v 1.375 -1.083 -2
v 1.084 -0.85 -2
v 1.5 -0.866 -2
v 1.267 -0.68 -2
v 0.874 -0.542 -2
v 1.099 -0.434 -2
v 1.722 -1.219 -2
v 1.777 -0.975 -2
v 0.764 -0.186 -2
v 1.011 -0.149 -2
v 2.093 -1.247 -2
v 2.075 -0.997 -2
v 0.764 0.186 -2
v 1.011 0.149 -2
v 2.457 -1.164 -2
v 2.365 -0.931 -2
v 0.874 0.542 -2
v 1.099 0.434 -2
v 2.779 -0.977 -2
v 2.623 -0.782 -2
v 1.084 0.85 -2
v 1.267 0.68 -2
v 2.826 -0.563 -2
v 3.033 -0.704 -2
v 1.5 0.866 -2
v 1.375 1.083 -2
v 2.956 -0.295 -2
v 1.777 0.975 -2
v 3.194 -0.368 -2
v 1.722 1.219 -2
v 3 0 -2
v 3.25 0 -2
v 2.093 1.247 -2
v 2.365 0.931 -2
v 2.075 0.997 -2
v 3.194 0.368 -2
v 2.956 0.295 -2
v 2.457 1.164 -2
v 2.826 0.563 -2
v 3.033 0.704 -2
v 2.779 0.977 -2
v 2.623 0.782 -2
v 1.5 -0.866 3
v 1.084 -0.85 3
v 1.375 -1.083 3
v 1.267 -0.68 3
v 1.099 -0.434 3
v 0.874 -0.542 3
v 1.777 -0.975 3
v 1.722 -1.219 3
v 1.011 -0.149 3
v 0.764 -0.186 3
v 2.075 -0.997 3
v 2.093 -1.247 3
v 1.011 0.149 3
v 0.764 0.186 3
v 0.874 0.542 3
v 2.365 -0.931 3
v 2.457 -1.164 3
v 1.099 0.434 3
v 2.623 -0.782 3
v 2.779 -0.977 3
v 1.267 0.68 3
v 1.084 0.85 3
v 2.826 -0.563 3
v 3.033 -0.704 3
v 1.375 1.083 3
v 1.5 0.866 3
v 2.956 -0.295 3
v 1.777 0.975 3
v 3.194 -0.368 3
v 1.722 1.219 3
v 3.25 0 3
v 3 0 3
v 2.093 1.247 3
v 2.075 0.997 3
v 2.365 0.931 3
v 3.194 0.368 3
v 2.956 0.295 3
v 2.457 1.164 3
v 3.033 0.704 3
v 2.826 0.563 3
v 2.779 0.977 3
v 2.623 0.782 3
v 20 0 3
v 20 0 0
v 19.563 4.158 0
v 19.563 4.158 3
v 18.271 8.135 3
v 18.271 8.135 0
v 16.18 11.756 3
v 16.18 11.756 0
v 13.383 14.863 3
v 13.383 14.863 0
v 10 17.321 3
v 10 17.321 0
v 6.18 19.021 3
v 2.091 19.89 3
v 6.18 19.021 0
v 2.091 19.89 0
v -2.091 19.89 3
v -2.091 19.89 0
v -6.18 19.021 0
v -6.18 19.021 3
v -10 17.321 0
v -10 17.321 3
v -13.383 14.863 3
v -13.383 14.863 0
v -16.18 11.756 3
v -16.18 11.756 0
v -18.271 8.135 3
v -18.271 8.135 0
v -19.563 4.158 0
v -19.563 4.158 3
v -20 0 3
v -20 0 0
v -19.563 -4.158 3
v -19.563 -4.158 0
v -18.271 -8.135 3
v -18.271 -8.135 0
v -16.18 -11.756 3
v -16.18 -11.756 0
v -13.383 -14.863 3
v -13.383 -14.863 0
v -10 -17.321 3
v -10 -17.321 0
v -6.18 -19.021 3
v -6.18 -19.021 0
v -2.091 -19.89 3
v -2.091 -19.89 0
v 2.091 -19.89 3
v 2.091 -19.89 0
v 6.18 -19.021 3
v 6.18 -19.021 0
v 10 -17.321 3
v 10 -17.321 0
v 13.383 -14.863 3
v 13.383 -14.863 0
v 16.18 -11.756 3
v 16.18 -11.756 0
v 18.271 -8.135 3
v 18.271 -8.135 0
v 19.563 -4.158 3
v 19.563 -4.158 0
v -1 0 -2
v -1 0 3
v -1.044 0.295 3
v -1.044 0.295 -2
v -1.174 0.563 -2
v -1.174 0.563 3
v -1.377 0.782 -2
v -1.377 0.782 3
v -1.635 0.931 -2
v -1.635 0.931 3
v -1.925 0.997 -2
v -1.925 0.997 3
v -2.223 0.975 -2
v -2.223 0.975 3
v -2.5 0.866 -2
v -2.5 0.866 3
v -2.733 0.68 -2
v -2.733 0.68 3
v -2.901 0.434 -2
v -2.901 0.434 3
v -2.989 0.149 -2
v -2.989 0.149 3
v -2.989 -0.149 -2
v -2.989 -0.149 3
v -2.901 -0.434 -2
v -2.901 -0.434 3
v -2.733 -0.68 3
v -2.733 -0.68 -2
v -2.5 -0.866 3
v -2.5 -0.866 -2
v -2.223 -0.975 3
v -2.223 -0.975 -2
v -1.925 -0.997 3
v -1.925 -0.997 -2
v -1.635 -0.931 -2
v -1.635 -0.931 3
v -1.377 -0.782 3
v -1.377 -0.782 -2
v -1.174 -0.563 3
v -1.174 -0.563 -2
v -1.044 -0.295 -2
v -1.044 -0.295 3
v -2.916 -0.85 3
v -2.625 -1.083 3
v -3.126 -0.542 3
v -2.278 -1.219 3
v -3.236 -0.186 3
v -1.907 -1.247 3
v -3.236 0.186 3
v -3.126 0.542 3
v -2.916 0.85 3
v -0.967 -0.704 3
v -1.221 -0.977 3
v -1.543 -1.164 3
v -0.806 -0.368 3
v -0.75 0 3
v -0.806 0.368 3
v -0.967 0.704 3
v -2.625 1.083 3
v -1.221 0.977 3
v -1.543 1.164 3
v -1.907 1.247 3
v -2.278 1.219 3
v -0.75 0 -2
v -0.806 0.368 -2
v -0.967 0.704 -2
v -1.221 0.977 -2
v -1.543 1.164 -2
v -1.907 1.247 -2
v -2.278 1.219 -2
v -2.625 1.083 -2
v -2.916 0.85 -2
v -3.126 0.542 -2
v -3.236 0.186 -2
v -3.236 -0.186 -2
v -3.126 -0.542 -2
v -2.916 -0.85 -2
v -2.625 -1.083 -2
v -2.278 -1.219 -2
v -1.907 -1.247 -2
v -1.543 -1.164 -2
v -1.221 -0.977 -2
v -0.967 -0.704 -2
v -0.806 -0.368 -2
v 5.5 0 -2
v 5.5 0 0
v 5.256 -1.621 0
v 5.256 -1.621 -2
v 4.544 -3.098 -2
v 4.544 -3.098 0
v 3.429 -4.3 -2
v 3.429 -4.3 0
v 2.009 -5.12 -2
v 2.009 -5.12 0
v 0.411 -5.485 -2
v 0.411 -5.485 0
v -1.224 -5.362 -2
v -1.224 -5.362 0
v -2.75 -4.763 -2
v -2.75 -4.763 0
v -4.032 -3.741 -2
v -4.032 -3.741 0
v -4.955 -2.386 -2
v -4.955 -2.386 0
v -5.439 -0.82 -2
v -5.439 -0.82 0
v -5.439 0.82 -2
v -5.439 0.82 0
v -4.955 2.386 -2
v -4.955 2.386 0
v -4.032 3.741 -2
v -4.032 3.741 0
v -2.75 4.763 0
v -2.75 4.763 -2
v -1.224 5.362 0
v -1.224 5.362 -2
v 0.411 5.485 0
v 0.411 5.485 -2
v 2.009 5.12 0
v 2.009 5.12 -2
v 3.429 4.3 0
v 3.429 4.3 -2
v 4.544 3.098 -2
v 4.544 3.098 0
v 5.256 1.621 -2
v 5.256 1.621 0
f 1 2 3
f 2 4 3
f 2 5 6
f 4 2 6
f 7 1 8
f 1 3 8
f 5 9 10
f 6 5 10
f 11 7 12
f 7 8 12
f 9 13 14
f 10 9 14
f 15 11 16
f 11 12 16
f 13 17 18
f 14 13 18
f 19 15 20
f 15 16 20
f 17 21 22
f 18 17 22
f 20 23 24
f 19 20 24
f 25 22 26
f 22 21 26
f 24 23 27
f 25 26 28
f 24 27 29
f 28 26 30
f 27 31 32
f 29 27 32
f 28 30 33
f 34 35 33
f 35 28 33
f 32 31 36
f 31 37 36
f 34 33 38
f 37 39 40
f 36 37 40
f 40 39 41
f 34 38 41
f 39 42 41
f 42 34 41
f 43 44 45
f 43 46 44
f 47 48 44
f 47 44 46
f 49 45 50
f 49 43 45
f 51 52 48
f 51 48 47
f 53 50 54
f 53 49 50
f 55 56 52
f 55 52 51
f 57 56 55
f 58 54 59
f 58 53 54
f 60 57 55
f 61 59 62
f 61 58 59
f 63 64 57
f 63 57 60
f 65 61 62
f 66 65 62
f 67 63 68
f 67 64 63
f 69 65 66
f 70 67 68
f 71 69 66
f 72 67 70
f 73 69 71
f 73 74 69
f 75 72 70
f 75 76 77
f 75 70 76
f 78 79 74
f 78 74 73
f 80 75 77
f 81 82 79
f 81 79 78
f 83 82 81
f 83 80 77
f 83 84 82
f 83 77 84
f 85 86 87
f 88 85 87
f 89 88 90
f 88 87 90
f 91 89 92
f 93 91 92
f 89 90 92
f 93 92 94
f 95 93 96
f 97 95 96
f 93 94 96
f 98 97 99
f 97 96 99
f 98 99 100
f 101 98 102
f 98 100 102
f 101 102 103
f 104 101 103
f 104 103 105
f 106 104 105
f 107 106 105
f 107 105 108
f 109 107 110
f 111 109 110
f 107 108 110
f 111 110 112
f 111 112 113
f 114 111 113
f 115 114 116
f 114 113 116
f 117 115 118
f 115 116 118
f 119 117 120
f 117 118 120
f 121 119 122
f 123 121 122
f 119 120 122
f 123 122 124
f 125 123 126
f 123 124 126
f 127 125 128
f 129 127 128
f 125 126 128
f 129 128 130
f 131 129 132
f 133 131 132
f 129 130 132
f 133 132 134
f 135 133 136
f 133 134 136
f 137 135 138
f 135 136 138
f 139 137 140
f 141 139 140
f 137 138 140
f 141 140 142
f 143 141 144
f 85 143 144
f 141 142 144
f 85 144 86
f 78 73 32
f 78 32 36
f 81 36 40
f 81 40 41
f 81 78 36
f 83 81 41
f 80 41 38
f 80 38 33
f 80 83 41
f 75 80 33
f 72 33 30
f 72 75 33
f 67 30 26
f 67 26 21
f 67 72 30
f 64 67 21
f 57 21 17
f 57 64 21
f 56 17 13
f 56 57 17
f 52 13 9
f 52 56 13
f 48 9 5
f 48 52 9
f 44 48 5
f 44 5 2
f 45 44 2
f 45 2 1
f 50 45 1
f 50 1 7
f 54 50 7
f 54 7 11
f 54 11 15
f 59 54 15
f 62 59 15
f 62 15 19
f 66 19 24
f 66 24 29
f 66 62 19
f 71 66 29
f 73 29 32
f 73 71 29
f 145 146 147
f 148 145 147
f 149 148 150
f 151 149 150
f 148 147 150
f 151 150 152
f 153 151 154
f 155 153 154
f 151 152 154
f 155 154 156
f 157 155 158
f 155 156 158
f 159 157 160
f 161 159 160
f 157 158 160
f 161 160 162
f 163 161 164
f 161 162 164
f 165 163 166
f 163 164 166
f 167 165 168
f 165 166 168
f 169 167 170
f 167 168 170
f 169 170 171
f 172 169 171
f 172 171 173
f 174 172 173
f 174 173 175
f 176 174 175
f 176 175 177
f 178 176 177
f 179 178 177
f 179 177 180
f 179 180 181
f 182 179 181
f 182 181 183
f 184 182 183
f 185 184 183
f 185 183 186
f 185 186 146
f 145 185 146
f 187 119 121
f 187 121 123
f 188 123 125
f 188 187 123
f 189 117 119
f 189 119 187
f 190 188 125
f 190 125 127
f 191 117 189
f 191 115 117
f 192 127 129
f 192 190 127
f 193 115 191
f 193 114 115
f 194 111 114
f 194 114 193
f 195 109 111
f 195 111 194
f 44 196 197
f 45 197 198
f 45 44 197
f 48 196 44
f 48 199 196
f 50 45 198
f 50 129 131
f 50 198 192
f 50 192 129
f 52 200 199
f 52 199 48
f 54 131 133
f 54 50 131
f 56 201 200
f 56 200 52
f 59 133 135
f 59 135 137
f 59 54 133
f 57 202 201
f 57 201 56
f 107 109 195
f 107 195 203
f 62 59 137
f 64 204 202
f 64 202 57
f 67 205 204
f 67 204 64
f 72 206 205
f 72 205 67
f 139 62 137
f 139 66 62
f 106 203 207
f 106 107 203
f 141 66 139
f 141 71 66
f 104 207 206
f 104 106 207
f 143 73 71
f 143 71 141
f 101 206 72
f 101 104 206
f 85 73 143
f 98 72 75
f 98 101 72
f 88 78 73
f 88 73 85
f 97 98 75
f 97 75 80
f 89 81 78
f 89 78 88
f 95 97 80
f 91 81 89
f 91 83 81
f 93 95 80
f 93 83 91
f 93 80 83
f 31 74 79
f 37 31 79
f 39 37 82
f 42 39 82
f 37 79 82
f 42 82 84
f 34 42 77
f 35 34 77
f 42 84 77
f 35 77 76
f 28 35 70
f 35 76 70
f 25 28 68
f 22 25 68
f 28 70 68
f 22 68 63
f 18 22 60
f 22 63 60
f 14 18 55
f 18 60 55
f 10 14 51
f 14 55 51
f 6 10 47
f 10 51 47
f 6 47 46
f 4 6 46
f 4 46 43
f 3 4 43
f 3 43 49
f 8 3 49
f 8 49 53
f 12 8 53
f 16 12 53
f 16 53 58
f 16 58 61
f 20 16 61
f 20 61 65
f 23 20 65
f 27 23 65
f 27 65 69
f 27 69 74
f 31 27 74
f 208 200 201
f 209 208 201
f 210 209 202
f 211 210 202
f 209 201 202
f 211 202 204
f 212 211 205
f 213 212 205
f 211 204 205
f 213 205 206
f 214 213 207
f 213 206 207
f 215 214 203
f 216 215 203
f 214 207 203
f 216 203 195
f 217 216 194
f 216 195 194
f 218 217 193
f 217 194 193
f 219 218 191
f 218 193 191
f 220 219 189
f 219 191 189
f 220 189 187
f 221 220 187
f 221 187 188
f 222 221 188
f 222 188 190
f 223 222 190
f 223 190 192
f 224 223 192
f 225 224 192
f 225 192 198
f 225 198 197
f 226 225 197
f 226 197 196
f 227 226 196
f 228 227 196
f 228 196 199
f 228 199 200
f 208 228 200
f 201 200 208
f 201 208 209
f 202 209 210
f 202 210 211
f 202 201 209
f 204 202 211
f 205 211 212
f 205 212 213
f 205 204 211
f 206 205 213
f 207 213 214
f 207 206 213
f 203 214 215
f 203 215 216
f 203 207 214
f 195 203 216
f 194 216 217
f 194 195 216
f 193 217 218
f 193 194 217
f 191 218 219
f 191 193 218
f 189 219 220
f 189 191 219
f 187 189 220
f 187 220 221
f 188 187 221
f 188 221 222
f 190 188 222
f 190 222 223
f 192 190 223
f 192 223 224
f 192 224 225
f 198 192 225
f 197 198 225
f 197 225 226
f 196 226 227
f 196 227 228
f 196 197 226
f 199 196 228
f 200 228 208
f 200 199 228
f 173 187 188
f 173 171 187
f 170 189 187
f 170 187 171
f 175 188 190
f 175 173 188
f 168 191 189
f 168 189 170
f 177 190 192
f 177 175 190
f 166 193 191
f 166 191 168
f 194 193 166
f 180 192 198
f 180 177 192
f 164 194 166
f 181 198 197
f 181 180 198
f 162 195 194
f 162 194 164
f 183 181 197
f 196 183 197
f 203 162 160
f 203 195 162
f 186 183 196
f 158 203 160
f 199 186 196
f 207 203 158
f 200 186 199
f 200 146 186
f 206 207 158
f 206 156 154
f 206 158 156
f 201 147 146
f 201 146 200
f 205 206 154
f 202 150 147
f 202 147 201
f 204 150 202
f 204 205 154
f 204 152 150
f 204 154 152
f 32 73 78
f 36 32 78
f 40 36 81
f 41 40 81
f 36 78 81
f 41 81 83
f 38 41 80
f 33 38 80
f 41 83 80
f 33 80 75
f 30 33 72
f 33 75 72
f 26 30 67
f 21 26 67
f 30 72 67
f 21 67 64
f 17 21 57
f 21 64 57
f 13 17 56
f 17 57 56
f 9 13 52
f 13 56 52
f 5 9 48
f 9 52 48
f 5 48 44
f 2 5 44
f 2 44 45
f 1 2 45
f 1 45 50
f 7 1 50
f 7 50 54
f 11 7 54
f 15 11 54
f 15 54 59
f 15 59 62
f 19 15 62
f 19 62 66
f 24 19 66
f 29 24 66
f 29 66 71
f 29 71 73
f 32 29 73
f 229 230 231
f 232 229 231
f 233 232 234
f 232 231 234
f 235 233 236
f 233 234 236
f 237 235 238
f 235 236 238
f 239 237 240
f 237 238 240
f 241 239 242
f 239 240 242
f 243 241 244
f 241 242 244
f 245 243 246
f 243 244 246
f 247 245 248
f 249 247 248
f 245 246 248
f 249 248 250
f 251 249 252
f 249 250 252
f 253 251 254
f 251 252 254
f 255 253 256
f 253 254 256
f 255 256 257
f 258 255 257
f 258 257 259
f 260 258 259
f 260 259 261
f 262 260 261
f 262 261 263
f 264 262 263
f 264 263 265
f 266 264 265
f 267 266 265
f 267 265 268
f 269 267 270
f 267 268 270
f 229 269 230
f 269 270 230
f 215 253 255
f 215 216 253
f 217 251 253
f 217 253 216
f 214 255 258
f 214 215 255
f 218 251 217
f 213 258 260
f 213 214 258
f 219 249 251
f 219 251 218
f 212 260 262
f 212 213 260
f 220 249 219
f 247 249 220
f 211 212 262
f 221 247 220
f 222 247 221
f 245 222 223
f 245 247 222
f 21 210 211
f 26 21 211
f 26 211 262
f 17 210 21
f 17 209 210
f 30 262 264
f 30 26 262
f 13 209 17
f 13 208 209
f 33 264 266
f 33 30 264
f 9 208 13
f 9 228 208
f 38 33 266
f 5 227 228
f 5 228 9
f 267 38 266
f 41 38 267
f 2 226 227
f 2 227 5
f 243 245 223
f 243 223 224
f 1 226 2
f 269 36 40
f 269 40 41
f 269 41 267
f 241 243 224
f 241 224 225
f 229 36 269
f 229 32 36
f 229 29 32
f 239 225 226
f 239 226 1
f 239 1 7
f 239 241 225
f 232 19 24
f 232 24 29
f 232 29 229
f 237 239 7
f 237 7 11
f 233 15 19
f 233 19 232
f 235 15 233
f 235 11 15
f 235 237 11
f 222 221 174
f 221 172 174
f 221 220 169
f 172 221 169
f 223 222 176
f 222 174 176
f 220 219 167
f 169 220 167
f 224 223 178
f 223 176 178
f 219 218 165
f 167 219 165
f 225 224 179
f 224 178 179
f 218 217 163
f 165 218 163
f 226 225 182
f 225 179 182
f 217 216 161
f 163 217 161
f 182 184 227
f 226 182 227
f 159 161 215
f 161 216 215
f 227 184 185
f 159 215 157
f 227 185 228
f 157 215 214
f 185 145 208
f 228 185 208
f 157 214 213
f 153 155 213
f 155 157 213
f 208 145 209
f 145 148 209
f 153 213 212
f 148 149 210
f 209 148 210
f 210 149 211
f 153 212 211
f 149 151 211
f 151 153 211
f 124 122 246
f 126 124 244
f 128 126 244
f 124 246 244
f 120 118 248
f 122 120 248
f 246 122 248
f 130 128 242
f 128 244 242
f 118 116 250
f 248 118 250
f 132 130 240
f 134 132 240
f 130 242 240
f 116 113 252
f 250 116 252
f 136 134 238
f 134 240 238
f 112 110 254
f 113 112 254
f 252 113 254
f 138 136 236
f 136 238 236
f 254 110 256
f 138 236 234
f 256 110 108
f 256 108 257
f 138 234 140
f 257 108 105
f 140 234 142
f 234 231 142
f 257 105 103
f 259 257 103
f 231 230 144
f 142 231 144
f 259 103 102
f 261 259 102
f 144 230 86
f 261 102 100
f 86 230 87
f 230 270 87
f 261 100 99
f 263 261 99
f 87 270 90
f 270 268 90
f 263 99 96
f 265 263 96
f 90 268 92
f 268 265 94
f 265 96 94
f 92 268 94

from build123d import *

# Parameters (mm, degrees)
F0_R     = 20
F1_DEPTH = 3
F2_R     = 5.5
F3_DEPTH = 2
F4_R     = 1.25
F5_DEPTH = 25
F6_R     = 1.25
F7_DEPTH = 5
F8_R     = 1
F9_DEPTH = 25


with BuildPart() as f1:
    # F0 (on Top) → F1 (new body)
    with BuildSketch(Plane.XY):
        Circle(F0_R)
    extrude(amount=F1_DEPTH)

    # F2 (on face) → F3 (join)
    with BuildSketch(Plane(origin=(0, 0, 0), x_dir=(1, 0, 0), z_dir=(0, 0, -1))):
        Circle(F2_R)
    extrude(amount=F3_DEPTH)

    # F4 (on face) → F5 (cut)
    with BuildSketch(Plane.XY.offset(3)):
        with Locations((-2, 0)):
            Circle(F4_R)
        with Locations((2, 0)):
            Circle(F4_R)
    extrude(amount=-F5_DEPTH, mode=Mode.SUBTRACT)


with BuildPart() as f7:
    # F6 (on face) → F7 (new body)
    with BuildSketch(Plane.XY.offset(3)):
        with Locations((-2, 0)):
            Circle(F6_R)
        with Locations((2, 0)):
            Circle(F6_R)
    extrude(amount=-F7_DEPTH)

    # F8 (on face) → F9 (cut)
    with BuildSketch(Plane.XY.offset(3)):
        with Locations((-2, 0)):
            Circle(F8_R)
        with Locations((2, 0)):
            Circle(F8_R)
    extrude(amount=-F9_DEPTH, mode=Mode.SUBTRACT)


solid = Compound([f1.part, f7.part])
